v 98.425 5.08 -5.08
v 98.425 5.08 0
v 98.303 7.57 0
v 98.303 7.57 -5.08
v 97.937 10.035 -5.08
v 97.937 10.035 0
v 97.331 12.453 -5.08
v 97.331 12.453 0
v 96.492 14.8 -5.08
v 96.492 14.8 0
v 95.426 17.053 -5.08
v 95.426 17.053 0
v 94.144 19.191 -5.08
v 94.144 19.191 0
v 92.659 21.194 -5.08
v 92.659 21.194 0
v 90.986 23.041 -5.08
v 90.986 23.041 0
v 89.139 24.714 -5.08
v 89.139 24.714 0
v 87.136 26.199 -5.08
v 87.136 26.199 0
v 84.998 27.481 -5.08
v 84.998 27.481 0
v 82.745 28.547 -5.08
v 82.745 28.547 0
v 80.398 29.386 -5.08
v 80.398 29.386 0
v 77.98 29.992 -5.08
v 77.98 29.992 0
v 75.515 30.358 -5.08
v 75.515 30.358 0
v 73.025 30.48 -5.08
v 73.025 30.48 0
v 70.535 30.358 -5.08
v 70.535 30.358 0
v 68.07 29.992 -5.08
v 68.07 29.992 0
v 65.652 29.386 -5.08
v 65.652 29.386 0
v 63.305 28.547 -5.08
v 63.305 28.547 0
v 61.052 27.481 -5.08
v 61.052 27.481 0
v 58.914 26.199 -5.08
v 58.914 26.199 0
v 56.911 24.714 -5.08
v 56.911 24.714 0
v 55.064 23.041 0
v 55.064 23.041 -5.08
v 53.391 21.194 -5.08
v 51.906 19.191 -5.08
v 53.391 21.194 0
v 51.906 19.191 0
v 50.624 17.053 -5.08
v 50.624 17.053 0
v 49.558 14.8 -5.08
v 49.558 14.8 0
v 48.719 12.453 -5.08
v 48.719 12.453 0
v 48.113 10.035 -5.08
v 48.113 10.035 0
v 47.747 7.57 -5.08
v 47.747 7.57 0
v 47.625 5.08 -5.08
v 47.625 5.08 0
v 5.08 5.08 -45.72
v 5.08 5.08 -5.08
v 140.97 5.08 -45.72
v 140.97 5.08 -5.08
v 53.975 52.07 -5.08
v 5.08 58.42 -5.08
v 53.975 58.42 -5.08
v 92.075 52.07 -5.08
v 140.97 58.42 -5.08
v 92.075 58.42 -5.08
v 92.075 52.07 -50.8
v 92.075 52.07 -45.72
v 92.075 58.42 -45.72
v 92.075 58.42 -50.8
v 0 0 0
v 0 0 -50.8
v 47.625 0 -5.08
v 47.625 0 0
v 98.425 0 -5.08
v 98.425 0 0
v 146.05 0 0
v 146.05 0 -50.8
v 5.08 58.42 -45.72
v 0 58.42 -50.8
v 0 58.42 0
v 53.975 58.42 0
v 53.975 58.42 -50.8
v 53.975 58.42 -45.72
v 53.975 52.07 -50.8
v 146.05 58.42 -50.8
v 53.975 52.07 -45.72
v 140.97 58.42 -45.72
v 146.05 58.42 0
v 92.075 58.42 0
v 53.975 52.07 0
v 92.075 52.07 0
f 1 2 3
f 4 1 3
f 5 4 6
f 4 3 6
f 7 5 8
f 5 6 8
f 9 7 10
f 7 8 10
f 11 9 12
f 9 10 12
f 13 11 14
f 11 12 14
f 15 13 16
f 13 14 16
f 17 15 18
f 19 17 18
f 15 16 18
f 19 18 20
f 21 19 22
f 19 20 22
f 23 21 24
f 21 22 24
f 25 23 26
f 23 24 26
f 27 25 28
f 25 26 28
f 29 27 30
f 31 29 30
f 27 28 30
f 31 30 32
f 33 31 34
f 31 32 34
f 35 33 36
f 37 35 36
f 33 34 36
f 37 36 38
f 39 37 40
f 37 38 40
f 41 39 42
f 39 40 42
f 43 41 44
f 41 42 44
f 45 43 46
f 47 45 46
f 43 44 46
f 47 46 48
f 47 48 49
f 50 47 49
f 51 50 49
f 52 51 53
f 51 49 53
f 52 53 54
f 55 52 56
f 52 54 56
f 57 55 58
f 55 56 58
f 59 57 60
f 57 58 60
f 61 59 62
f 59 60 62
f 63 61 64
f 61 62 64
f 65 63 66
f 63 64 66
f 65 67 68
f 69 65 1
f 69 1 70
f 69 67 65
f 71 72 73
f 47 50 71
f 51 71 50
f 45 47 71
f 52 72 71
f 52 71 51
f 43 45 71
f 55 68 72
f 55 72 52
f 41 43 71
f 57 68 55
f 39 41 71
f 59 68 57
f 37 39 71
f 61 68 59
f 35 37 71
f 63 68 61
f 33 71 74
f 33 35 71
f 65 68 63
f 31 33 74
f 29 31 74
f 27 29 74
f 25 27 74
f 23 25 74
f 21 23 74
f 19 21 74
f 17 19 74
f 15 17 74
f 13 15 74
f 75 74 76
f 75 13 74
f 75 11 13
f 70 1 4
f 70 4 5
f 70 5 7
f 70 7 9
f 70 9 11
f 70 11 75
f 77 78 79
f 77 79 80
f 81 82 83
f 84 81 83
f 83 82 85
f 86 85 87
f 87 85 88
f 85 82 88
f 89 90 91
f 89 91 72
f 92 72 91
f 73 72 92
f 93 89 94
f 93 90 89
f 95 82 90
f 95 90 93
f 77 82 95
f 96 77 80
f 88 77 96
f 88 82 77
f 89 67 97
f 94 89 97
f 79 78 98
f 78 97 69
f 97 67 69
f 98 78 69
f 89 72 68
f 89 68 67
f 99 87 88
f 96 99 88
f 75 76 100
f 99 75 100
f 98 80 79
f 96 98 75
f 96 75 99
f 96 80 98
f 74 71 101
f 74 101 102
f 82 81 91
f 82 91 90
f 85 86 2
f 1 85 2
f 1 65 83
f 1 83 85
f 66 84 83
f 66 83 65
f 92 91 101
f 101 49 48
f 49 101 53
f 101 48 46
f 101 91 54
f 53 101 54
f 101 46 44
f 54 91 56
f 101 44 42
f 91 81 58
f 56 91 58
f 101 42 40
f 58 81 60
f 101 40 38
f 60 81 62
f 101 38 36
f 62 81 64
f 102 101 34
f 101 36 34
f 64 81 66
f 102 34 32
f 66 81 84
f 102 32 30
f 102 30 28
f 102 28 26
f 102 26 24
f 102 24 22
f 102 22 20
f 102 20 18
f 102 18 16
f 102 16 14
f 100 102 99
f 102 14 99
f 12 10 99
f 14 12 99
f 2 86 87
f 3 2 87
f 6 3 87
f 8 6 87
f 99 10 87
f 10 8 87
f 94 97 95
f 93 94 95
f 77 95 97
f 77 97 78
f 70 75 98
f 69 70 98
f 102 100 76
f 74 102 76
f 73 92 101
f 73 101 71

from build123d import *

# Parameters (mm, degrees)
SKETCH1_W           = 146.05
SKETCH1_H           = 50.8
BOSS_EXTRUDE1_DEPTH = 58.42
SHELL1_T            = -5.08
SKETCH2_W           = 50.8
SKETCH2_H           = 5.08
CUT_EXTRUDE2_DEPTH  = 5.08
SKETCH4_W           = 38.1
SKETCH4_H           = 50.8
CUT_EXTRUDE3_DEPTH  = 6.35


with BuildPart() as part:
    # Sketch1 → Boss-Extrude1 (new body)
    with BuildSketch(Plane(origin=(0, 0, 0), x_dir=(1, 0, 0), z_dir=(0, 1, 0))):
        with Locations((73.025, 25.4)):
            Rectangle(SKETCH1_W, SKETCH1_H)
    extrude(amount=BOSS_EXTRUDE1_DEPTH)

    # Shell1
    shell1_openings = [part.faces().sort_by_distance(p)[0] for p in [
        (73.025, 58.42, -25.4),
    ]]
    offset(amount=SHELL1_T, openings=shell1_openings, kind=Kind.INTERSECTION)

    # Sketch2 → Cut-Extrude2 (cut)
    with BuildSketch(Plane.XY):
        with Locations((73.025, 2.54)):
            Rectangle(SKETCH2_W, SKETCH2_H)
        with BuildLine():
            ThreePointArc((98.425, 5.08), (73.025, 30.48), (47.625, 5.08))
            Line((47.625, 5.08), (98.425, 5.08))
        make_face()
    extrude(amount=-CUT_EXTRUDE2_DEPTH, mode=Mode.SUBTRACT)

    # Sketch4 → Cut-Extrude3 (cut)
    with BuildSketch(Plane(origin=(0, 58.42, 0), x_dir=(1, 0, 0), z_dir=(0, 1, 0))):
        with Locations((73.025, 25.4)):
            Rectangle(SKETCH4_W, SKETCH4_H)
    extrude(amount=-CUT_EXTRUDE3_DEPTH, mode=Mode.SUBTRACT)


solid = part.part
